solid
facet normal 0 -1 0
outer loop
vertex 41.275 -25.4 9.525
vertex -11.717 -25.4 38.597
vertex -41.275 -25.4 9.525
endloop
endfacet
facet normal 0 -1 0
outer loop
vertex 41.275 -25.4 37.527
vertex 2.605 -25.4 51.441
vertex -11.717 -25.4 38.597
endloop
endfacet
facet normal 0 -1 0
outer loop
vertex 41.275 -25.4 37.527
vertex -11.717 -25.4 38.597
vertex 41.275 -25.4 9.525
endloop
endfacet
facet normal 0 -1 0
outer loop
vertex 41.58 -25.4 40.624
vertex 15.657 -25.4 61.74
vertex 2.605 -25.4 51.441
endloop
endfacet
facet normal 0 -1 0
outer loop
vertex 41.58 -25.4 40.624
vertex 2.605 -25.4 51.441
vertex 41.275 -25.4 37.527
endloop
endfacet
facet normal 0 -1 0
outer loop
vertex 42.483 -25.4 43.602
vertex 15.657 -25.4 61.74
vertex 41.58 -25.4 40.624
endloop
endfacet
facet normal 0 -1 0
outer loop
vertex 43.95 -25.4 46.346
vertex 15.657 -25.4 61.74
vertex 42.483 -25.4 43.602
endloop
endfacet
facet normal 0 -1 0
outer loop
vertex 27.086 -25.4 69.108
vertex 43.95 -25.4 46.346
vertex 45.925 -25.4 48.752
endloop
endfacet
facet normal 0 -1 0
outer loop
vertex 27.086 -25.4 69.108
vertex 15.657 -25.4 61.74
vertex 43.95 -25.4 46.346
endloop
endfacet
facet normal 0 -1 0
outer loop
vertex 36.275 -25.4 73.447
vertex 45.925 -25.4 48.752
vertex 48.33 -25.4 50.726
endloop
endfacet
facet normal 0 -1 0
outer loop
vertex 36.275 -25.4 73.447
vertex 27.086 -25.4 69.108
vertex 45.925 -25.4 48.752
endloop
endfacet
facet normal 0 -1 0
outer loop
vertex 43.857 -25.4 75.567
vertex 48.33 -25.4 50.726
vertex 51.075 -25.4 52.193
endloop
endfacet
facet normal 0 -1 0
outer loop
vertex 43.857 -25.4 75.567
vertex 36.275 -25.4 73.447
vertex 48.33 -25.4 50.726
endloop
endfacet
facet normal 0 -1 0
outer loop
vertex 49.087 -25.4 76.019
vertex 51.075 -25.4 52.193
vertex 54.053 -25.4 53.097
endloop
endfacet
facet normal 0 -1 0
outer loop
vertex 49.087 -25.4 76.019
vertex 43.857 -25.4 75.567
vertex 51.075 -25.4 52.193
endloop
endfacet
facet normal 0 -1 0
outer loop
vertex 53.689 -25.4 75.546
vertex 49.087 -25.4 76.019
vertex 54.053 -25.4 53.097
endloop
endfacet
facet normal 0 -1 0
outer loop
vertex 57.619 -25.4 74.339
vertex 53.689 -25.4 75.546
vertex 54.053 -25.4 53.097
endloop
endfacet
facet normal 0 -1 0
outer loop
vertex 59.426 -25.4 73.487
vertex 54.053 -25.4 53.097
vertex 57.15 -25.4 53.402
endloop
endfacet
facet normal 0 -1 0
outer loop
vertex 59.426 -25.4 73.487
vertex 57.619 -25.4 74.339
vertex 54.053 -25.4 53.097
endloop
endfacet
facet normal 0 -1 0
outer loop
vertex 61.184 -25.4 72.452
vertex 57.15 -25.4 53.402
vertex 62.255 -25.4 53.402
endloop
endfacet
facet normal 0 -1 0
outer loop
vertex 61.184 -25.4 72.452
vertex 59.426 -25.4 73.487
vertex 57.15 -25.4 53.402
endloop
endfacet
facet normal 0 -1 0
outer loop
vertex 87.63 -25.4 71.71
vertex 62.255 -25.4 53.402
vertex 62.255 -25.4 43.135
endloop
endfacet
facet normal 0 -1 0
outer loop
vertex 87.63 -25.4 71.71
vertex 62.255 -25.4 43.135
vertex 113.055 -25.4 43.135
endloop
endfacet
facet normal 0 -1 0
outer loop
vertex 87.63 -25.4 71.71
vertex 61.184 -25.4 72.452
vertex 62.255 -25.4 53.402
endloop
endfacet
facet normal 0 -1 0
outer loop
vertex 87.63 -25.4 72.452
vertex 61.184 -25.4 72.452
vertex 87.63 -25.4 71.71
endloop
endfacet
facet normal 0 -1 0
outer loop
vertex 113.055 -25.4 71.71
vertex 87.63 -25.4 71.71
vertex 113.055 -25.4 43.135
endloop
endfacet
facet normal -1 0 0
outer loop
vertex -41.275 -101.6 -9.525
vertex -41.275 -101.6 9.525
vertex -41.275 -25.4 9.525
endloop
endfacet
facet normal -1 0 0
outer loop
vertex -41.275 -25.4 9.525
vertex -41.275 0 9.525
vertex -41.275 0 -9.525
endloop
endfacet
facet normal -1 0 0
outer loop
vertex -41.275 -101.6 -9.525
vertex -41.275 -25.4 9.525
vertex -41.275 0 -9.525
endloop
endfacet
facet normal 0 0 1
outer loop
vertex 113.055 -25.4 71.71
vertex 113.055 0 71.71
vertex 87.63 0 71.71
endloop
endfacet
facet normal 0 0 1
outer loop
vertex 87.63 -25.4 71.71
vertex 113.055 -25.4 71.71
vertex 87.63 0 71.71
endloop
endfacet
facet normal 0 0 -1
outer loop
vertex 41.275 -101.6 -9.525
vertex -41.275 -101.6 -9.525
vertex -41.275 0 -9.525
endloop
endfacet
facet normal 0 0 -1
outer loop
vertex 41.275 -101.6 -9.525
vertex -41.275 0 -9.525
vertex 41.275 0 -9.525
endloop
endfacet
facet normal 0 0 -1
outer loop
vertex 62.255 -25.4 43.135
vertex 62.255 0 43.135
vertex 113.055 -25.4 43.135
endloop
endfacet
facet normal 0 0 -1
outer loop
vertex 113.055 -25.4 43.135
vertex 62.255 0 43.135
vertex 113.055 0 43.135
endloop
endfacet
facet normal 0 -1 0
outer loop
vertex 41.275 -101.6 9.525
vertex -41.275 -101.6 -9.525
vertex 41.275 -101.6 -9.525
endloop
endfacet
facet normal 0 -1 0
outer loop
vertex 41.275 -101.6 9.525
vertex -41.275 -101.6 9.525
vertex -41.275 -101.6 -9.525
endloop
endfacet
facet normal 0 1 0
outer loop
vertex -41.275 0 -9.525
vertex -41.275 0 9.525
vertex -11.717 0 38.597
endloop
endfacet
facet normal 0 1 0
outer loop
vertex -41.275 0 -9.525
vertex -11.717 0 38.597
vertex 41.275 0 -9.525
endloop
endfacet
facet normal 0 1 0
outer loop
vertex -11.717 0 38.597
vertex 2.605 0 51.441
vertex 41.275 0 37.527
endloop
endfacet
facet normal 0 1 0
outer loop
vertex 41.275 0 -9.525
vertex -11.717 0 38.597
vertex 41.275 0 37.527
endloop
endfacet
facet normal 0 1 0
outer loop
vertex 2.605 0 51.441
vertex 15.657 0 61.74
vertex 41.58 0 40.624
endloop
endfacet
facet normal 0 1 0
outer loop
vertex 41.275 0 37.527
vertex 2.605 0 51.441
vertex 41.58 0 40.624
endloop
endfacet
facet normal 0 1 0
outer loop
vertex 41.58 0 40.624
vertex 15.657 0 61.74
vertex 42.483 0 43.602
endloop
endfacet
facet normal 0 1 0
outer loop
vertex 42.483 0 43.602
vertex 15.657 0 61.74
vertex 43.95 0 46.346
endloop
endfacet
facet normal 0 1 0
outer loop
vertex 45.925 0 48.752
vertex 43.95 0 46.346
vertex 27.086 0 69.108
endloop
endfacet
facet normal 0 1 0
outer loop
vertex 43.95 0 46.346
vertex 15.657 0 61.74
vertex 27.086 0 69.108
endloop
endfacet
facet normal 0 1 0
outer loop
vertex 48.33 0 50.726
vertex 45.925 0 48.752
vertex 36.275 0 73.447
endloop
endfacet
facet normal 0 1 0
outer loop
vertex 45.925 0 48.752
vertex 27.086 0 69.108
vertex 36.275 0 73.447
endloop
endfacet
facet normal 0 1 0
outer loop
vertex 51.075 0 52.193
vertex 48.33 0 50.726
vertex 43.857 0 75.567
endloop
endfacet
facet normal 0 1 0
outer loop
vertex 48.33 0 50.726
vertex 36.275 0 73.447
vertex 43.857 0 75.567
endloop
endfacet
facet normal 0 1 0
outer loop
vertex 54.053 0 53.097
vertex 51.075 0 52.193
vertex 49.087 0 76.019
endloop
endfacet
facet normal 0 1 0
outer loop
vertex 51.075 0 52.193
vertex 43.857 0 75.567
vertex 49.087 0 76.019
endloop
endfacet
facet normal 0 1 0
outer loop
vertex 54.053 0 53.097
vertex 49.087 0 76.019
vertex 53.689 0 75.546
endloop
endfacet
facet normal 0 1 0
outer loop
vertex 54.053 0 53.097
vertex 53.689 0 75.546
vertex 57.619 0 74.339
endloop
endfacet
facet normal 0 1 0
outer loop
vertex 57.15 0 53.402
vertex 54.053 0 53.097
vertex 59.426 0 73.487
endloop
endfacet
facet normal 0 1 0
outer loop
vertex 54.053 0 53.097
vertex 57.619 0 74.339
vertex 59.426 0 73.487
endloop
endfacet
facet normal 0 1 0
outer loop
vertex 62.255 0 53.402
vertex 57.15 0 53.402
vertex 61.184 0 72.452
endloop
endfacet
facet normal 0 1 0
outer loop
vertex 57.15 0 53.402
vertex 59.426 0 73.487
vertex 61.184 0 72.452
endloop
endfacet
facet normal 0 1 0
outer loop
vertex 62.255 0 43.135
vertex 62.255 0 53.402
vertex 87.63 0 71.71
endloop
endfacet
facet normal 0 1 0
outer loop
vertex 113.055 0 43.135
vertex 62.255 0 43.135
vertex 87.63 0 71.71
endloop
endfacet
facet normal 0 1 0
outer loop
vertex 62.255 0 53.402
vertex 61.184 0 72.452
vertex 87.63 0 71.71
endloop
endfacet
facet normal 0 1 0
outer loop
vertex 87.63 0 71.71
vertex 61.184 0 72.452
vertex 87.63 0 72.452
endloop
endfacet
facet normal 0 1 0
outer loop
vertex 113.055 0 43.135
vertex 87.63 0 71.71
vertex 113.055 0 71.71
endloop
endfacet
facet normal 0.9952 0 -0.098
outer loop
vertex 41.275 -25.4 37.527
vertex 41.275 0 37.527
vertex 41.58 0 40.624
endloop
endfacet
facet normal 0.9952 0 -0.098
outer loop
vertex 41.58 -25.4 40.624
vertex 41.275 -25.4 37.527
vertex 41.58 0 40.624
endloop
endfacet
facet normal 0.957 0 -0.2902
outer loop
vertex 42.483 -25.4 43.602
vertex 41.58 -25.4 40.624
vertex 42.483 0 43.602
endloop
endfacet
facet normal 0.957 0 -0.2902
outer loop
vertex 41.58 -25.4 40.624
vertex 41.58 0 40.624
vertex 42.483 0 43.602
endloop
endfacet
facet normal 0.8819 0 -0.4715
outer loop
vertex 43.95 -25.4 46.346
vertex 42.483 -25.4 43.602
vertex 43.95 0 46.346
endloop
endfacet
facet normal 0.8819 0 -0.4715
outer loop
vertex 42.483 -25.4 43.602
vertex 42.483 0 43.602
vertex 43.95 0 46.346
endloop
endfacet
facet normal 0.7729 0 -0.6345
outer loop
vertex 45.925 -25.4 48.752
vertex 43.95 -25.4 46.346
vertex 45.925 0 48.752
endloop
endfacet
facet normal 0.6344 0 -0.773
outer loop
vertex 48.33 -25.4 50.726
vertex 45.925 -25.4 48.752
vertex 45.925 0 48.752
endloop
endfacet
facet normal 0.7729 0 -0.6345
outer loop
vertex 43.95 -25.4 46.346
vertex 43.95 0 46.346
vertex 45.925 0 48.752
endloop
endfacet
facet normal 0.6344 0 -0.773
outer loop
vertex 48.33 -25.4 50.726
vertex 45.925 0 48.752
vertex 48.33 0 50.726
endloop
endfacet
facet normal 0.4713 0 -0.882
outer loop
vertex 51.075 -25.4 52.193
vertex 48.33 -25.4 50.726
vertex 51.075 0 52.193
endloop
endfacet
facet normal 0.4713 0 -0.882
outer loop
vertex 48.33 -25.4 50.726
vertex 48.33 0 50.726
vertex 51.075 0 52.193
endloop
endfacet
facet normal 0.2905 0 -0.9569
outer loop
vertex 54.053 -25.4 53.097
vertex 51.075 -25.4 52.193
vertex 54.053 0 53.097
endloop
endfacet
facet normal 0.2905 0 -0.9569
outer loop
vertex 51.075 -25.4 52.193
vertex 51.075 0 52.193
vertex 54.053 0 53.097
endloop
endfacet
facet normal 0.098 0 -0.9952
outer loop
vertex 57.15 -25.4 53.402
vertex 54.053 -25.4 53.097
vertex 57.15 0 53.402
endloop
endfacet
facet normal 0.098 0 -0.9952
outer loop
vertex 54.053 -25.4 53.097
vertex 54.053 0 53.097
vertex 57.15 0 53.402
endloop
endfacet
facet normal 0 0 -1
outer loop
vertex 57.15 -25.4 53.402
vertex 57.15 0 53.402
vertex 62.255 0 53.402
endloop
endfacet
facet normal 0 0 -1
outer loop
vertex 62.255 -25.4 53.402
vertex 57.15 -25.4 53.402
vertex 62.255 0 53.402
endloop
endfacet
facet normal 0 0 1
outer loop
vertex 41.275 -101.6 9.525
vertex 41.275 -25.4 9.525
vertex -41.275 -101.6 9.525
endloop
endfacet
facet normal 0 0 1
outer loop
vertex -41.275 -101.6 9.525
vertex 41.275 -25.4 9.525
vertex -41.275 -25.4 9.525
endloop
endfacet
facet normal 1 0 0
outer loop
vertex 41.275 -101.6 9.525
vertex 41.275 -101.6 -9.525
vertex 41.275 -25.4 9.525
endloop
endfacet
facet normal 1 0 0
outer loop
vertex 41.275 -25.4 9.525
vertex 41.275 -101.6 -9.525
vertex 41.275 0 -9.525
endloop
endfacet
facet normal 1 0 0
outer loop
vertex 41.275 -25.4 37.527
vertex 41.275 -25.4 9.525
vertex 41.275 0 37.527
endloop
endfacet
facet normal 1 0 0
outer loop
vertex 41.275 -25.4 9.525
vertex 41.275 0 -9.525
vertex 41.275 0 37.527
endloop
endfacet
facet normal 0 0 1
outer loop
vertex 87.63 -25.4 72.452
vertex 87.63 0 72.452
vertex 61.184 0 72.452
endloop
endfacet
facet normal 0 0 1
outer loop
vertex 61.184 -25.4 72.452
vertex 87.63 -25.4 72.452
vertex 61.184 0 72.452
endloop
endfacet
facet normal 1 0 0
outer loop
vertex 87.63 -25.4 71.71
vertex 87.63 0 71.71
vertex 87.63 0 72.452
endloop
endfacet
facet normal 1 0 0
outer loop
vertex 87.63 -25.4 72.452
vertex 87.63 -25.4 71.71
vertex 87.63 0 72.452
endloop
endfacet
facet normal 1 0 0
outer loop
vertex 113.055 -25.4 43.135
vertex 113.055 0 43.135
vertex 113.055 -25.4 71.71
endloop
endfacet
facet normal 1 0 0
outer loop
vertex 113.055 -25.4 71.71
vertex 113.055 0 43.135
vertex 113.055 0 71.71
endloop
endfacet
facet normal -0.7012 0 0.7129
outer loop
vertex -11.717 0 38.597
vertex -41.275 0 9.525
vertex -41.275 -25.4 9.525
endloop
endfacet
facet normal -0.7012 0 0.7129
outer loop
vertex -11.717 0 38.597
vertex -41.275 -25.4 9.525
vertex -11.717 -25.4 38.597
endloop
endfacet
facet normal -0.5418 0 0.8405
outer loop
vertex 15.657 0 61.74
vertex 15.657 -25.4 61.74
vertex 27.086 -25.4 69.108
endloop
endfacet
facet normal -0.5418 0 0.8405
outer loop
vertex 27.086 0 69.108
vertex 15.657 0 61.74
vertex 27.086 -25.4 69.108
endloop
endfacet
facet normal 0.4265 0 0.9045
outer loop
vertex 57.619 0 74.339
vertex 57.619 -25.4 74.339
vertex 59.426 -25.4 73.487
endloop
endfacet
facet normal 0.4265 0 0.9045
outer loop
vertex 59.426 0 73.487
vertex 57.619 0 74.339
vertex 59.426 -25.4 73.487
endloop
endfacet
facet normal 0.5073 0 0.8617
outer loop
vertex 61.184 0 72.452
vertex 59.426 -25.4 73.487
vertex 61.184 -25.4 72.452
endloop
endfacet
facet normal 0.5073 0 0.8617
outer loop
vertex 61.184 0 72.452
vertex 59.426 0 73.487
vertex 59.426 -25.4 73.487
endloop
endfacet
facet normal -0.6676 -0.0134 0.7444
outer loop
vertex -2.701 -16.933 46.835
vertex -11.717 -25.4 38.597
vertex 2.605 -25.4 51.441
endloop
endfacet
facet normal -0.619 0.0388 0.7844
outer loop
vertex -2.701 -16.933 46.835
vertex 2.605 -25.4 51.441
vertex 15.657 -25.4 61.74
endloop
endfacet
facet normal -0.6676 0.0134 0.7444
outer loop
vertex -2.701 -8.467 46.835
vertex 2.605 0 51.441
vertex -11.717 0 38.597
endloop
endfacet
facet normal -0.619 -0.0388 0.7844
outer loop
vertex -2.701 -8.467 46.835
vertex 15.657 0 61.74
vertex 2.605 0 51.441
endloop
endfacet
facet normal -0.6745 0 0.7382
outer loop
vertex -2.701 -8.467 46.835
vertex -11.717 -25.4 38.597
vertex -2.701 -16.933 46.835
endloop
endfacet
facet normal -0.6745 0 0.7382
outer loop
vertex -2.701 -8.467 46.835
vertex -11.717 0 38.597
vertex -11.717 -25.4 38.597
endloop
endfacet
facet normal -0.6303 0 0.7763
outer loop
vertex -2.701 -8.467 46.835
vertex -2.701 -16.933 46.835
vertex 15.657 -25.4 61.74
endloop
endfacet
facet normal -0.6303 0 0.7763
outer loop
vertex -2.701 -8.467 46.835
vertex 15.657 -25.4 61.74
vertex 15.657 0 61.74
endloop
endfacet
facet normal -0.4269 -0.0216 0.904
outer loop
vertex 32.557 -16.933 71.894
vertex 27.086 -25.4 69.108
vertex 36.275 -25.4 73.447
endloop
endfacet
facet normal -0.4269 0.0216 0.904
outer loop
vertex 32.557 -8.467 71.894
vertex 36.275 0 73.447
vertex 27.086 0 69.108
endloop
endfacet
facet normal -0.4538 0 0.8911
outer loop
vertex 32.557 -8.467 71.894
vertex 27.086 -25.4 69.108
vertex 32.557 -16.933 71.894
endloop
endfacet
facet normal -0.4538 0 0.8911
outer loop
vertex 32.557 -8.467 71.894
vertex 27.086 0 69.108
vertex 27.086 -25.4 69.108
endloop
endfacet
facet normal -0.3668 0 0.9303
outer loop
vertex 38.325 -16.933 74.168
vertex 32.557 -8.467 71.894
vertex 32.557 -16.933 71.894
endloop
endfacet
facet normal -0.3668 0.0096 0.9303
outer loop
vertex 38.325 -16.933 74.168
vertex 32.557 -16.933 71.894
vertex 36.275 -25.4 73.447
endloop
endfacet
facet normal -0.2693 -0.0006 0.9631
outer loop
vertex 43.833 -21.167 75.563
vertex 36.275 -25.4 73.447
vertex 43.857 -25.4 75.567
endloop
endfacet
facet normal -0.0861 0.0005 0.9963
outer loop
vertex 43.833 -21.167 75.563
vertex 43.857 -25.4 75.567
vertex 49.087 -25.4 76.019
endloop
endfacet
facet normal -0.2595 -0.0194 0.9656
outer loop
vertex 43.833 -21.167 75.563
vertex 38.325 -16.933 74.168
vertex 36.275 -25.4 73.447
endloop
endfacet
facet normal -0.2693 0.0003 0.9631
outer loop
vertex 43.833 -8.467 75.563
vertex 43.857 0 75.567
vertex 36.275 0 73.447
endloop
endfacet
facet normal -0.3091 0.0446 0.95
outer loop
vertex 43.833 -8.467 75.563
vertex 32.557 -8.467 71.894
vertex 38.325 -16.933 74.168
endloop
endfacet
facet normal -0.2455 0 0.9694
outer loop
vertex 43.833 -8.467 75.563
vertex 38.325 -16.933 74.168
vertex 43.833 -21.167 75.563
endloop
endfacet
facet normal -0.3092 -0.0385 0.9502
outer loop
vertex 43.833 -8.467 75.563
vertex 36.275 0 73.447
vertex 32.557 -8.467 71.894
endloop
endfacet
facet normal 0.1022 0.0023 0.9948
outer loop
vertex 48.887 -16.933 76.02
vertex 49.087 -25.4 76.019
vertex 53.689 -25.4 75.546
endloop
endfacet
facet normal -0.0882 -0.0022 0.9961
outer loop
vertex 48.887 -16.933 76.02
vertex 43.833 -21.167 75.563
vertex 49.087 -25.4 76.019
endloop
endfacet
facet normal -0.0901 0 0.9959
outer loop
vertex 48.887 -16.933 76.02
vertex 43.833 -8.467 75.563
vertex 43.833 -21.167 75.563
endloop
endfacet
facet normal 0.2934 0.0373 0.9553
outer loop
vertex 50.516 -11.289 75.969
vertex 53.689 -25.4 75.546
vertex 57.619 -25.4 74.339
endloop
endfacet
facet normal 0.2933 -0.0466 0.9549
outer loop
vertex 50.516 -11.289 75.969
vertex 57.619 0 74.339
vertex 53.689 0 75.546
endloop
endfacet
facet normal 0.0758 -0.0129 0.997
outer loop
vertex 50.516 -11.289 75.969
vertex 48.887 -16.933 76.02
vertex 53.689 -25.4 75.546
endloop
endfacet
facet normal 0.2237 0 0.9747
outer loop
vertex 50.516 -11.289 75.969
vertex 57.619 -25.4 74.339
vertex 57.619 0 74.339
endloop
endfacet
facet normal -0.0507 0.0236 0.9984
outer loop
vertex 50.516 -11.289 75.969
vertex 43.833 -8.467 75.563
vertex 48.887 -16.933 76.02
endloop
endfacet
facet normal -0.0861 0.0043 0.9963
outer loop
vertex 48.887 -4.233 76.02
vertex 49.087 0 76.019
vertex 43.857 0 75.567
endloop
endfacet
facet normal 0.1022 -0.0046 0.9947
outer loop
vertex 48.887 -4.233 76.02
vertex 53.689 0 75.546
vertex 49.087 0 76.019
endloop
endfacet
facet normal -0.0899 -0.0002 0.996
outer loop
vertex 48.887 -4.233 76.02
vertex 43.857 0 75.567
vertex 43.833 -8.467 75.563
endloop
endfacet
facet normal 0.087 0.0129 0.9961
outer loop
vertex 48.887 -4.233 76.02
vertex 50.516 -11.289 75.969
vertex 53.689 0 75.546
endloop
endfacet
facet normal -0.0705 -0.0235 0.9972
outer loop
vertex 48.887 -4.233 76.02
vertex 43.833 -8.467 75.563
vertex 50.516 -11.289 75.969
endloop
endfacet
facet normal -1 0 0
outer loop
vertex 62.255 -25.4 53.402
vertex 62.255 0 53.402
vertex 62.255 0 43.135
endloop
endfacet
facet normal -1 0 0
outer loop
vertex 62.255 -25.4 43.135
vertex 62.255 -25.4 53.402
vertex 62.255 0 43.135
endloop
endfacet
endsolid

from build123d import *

# Parameters (mm, degrees)
F1_DEPTH = 101.6
F2_DEPTH = 25.4


with BuildPart() as f1:
    # F0 (on Front) → F1 (new body)
    with BuildSketch(Plane.XZ):
        Polygon((-41.275, -9.525), (41.275, -9.525), (41.275, 9.525), (22.225, 9.525), (-41.275, 9.525), align=None)
    extrude(amount=F1_DEPTH)

    # F0 (on Front) → F2 (join)
    with BuildSketch(Plane.XZ):
        Polygon((-41.275, -9.525), (41.275, -9.525), (41.275, 9.525), (22.225, 9.525), (-41.275, 9.525), align=None)
        with BuildLine():
            Line((22.225, 9.525), (41.275, 9.525))
            Line((41.275, 9.525), (41.275, 37.5267544395))
            ThreePointArc((41.275, 37.5267544395), (45.9246798487, 48.7520745908), (57.15, 53.4017544395))
            Line((57.15, 53.4017544395), (62.2553965644, 53.4017544395))
            Line((62.2553965644, 53.4017544395), (62.2553965644, 71.7100659957))
            add(Edge.make_bspline(
                [(61.1839862246, 72.4517544395), (61.5444478672, 72.2168104336), (61.9016010693, 71.9696416328), (62.2553965644, 71.7100659957)],
                knots=[0.5333237342, 0.5333237342, 0.5333237342, 0.5333237342, 0.5412655487, 0.5412655487, 0.5412655487, 0.5412655487], degree=3))
            Line((61.1839862246, 72.4517544395), (57.15, 72.4517544395))
            ThreePointArc((57.15, 72.4517544395), (32.4542956671, 62.2224587724), (22.225, 37.5267544395))
            Line((22.225, 37.5267544395), (22.225, 9.525))
        make_face()
        with BuildLine():
            add(Edge.make_bspline(
                [(-41.275, 9.525), (-2.1487074739, 48.87707908), (36.9775850521, 88.2291581599), (61.1839862246, 72.4517544395)],
                knots=[0, 0, 0, 0, 0.5333237342, 0.5333237342, 0.5333237342, 0.5333237342], degree=3))
            Line((-41.275, 9.525), (22.225, 9.525))
            Line((22.225, 9.525), (22.225, 37.5267544395))
            ThreePointArc((22.225, 37.5267544395), (32.4542956671, 62.2224587724), (57.15, 72.4517544395))
            Line((57.15, 72.4517544395), (61.1839862246, 72.4517544395))
        make_face()
        with BuildLine():
            Line((87.63, 72.4517544395), (61.1839862246, 72.4517544395))
            add(Edge.make_bspline(
                [(61.1839862246, 72.4517544395), (61.5444478672, 72.2168104336), (61.9016010693, 71.9696416328), (62.2553965644, 71.7100659957)],
                knots=[0.5333237342, 0.5333237342, 0.5333237342, 0.5333237342, 0.5412655487, 0.5412655487, 0.5412655487, 0.5412655487], degree=3))
            Line((62.2553965644, 71.7100659957), (87.63, 71.7100659957))
            Line((87.63, 71.7100659957), (87.63, 72.4517544395))
        make_face()
        with BuildLine():
            add(Edge.make_bspline(
                [(62.2553965644, 71.7100659957), (67.5956887588, 67.7919557655), (72.1709689679, 61.0471014204), (75.9112780576, 53.4017544395)],
                knots=[0.5412655487, 0.5412655487, 0.5412655487, 0.5412655487, 0.6611416096, 0.6611416096, 0.6611416096, 0.6611416096], degree=3))
            Line((62.2553965644, 71.7100659957), (62.2553965644, 53.4017544395))
            Line((62.2553965644, 53.4017544395), (75.9112780576, 53.4017544395))
        make_face()
        with BuildLine():
            Line((87.63, 71.7100659957), (62.2553965644, 71.7100659957))
            add(Edge.make_bspline(
                [(62.2553965644, 71.7100659957), (67.5956887588, 67.7919557655), (72.1709689679, 61.0471014204), (75.9112780576, 53.4017544395)],
                knots=[0.5412655487, 0.5412655487, 0.5412655487, 0.5412655487, 0.6611416096, 0.6611416096, 0.6611416096, 0.6611416096], degree=3))
            Line((75.9112780576, 53.4017544395), (87.63, 53.4017544395))
            Line((87.63, 53.4017544395), (87.63, 71.7100659957))
        make_face()
        with BuildLine():
            Line((75.9112780576, 53.4017544395), (62.2553965644, 53.4017544395))
            Line((62.2553965644, 53.4017544395), (62.2553965644, 43.1350659957))
            Line((62.2553965644, 43.1350659957), (80.2891256511, 43.1350659957))
            add(Edge.make_bspline(
                [(75.9112780576, 53.4017544395), (77.5285535174, 50.0959762919), (78.989721228, 46.6218403707), (80.2891256511, 43.1350659957)],
                knots=[0.6611416096, 0.6611416096, 0.6611416096, 0.6611416096, 0.7129749225, 0.7129749225, 0.7129749225, 0.7129749225], degree=3))
        make_face()
        Polygon((113.0553965644, 71.7100659957), (87.63, 71.7100659957), (87.63, 53.4017544395), (87.63, 43.1350659957), (113.0553965644, 43.1350659957), align=None)
        with BuildLine():
            Line((87.63, 53.4017544395), (75.9112780576, 53.4017544395))
            add(Edge.make_bspline(
                [(75.9112780576, 53.4017544395), (77.5285535174, 50.0959762919), (78.989721228, 46.6218403707), (80.2891256511, 43.1350659957)],
                knots=[0.6611416096, 0.6611416096, 0.6611416096, 0.6611416096, 0.7129749225, 0.7129749225, 0.7129749225, 0.7129749225], degree=3))
            Line((80.2891256511, 43.1350659957), (87.63, 43.1350659957))
            Line((87.63, 43.1350659957), (87.63, 53.4017544395))
        make_face()
    extrude(amount=F2_DEPTH)


solid = f1.part
